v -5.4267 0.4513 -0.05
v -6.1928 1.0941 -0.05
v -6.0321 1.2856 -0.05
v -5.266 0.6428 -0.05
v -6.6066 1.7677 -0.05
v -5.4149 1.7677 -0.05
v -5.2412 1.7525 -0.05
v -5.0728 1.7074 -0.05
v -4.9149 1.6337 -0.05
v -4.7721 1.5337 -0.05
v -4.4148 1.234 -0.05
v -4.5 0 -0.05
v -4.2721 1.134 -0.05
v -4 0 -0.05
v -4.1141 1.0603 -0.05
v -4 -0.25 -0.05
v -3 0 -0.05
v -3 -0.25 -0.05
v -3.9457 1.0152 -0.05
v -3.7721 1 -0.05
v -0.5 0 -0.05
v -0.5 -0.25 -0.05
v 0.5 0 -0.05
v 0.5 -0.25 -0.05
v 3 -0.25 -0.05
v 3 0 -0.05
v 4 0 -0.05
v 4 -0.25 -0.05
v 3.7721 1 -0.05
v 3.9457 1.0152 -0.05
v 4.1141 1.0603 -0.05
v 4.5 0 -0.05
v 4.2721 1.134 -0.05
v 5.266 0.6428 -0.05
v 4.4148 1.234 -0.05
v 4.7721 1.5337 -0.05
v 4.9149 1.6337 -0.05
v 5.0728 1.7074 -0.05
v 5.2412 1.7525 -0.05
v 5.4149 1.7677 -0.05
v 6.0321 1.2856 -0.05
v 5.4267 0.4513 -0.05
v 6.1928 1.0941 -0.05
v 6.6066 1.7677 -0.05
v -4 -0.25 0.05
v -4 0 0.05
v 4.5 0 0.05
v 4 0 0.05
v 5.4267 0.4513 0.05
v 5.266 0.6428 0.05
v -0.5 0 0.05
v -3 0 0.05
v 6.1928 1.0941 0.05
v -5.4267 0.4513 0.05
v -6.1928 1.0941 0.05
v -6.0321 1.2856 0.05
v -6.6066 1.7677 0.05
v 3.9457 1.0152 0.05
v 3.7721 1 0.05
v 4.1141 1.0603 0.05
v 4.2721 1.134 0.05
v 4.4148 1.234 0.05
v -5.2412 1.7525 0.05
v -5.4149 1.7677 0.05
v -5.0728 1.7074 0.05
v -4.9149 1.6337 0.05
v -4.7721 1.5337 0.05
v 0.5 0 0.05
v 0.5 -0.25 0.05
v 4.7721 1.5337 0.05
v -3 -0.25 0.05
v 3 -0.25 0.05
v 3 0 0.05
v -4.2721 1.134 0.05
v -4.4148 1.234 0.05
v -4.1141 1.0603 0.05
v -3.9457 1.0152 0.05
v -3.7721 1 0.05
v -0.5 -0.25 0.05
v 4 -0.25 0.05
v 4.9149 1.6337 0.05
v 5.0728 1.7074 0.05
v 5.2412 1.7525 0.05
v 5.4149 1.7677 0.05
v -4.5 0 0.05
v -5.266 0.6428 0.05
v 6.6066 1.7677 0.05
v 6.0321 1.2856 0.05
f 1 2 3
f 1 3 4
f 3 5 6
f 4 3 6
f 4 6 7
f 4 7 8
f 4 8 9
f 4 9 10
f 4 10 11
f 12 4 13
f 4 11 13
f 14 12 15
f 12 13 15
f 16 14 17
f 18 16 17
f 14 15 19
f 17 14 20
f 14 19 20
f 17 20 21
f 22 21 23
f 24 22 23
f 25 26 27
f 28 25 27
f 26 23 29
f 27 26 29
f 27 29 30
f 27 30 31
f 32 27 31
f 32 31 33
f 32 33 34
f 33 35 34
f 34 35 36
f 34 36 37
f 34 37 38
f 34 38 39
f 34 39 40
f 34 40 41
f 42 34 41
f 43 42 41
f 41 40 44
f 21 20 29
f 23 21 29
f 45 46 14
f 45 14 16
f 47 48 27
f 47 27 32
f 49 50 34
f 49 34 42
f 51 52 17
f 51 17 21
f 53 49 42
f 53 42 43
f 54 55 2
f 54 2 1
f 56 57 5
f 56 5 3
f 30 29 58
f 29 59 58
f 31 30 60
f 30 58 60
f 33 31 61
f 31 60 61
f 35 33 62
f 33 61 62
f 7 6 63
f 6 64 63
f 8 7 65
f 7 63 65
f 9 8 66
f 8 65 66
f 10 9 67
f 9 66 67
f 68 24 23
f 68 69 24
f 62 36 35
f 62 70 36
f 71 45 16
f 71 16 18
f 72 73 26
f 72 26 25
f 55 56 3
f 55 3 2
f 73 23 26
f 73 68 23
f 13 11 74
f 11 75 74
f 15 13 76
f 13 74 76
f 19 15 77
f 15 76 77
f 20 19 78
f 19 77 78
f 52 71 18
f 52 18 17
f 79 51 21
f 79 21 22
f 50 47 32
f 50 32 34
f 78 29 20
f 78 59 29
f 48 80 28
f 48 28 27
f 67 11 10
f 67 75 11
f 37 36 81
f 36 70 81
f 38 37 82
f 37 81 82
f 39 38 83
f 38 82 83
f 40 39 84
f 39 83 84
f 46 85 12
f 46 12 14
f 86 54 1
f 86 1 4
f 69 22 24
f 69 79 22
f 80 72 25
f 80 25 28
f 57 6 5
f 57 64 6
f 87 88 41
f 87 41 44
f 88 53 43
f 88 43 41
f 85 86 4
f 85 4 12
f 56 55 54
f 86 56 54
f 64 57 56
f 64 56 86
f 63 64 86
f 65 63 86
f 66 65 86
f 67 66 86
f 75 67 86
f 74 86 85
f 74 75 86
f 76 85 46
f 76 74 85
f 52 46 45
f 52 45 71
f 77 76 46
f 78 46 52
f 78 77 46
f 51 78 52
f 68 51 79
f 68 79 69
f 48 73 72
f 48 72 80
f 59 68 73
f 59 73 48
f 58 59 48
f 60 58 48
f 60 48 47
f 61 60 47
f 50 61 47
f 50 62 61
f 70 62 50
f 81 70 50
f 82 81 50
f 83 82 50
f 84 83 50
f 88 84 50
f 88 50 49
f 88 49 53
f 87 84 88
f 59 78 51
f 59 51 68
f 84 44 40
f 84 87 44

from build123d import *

# Parameters (mm, degrees)
BOSS_EXTRUDE1_DEPTH = 0.05
FILLET1_R           = 1


with BuildPart() as part:
    # frame_outline → Boss-Extrude1 (new, symmetric)
    with BuildSketch(Plane.XY):
        Polygon((0.5, 0), (3, 0), (3, -0.25), (4, -0.25), (4, 0), (4.5, 0), (5.266044443, 0.64278761), (5.426741346, 0.451276499), (6.192785789, 1.094064109), (6.032088886, 1.285575219), (6.606622219, 1.767665927), (5.050898392, 1.767665927), (4.136029766, 1), (-4.136029766, 1), (-5.050898392, 1.767665927), (-6.606622219, 1.767665927), (-6.032088886, 1.285575219), (-6.192785789, 1.094064109), (-5.426741346, 0.451276499), (-5.266044443, 0.64278761), (-4.5, 0), (-4, 0), (-4, -0.25), (-3, -0.25), (-3, 0), (-0.5, 0), (-0.5, -0.25), (0.5, -0.25), align=None)
    extrude(amount=BOSS_EXTRUDE1_DEPTH, both=True)

    # Fillet1
    fillet1_edges = [part.edges().sort_by_distance(p)[0] for p in [
        (-5.050898392, 1.767665927, 0),
        (-4.136029766, 1, 0),
        (4.136029766, 1, 0),
        (5.050898392, 1.767665927, 0),
    ]]
    fillet(fillet1_edges, radius=FILLET1_R)


solid = part.part
